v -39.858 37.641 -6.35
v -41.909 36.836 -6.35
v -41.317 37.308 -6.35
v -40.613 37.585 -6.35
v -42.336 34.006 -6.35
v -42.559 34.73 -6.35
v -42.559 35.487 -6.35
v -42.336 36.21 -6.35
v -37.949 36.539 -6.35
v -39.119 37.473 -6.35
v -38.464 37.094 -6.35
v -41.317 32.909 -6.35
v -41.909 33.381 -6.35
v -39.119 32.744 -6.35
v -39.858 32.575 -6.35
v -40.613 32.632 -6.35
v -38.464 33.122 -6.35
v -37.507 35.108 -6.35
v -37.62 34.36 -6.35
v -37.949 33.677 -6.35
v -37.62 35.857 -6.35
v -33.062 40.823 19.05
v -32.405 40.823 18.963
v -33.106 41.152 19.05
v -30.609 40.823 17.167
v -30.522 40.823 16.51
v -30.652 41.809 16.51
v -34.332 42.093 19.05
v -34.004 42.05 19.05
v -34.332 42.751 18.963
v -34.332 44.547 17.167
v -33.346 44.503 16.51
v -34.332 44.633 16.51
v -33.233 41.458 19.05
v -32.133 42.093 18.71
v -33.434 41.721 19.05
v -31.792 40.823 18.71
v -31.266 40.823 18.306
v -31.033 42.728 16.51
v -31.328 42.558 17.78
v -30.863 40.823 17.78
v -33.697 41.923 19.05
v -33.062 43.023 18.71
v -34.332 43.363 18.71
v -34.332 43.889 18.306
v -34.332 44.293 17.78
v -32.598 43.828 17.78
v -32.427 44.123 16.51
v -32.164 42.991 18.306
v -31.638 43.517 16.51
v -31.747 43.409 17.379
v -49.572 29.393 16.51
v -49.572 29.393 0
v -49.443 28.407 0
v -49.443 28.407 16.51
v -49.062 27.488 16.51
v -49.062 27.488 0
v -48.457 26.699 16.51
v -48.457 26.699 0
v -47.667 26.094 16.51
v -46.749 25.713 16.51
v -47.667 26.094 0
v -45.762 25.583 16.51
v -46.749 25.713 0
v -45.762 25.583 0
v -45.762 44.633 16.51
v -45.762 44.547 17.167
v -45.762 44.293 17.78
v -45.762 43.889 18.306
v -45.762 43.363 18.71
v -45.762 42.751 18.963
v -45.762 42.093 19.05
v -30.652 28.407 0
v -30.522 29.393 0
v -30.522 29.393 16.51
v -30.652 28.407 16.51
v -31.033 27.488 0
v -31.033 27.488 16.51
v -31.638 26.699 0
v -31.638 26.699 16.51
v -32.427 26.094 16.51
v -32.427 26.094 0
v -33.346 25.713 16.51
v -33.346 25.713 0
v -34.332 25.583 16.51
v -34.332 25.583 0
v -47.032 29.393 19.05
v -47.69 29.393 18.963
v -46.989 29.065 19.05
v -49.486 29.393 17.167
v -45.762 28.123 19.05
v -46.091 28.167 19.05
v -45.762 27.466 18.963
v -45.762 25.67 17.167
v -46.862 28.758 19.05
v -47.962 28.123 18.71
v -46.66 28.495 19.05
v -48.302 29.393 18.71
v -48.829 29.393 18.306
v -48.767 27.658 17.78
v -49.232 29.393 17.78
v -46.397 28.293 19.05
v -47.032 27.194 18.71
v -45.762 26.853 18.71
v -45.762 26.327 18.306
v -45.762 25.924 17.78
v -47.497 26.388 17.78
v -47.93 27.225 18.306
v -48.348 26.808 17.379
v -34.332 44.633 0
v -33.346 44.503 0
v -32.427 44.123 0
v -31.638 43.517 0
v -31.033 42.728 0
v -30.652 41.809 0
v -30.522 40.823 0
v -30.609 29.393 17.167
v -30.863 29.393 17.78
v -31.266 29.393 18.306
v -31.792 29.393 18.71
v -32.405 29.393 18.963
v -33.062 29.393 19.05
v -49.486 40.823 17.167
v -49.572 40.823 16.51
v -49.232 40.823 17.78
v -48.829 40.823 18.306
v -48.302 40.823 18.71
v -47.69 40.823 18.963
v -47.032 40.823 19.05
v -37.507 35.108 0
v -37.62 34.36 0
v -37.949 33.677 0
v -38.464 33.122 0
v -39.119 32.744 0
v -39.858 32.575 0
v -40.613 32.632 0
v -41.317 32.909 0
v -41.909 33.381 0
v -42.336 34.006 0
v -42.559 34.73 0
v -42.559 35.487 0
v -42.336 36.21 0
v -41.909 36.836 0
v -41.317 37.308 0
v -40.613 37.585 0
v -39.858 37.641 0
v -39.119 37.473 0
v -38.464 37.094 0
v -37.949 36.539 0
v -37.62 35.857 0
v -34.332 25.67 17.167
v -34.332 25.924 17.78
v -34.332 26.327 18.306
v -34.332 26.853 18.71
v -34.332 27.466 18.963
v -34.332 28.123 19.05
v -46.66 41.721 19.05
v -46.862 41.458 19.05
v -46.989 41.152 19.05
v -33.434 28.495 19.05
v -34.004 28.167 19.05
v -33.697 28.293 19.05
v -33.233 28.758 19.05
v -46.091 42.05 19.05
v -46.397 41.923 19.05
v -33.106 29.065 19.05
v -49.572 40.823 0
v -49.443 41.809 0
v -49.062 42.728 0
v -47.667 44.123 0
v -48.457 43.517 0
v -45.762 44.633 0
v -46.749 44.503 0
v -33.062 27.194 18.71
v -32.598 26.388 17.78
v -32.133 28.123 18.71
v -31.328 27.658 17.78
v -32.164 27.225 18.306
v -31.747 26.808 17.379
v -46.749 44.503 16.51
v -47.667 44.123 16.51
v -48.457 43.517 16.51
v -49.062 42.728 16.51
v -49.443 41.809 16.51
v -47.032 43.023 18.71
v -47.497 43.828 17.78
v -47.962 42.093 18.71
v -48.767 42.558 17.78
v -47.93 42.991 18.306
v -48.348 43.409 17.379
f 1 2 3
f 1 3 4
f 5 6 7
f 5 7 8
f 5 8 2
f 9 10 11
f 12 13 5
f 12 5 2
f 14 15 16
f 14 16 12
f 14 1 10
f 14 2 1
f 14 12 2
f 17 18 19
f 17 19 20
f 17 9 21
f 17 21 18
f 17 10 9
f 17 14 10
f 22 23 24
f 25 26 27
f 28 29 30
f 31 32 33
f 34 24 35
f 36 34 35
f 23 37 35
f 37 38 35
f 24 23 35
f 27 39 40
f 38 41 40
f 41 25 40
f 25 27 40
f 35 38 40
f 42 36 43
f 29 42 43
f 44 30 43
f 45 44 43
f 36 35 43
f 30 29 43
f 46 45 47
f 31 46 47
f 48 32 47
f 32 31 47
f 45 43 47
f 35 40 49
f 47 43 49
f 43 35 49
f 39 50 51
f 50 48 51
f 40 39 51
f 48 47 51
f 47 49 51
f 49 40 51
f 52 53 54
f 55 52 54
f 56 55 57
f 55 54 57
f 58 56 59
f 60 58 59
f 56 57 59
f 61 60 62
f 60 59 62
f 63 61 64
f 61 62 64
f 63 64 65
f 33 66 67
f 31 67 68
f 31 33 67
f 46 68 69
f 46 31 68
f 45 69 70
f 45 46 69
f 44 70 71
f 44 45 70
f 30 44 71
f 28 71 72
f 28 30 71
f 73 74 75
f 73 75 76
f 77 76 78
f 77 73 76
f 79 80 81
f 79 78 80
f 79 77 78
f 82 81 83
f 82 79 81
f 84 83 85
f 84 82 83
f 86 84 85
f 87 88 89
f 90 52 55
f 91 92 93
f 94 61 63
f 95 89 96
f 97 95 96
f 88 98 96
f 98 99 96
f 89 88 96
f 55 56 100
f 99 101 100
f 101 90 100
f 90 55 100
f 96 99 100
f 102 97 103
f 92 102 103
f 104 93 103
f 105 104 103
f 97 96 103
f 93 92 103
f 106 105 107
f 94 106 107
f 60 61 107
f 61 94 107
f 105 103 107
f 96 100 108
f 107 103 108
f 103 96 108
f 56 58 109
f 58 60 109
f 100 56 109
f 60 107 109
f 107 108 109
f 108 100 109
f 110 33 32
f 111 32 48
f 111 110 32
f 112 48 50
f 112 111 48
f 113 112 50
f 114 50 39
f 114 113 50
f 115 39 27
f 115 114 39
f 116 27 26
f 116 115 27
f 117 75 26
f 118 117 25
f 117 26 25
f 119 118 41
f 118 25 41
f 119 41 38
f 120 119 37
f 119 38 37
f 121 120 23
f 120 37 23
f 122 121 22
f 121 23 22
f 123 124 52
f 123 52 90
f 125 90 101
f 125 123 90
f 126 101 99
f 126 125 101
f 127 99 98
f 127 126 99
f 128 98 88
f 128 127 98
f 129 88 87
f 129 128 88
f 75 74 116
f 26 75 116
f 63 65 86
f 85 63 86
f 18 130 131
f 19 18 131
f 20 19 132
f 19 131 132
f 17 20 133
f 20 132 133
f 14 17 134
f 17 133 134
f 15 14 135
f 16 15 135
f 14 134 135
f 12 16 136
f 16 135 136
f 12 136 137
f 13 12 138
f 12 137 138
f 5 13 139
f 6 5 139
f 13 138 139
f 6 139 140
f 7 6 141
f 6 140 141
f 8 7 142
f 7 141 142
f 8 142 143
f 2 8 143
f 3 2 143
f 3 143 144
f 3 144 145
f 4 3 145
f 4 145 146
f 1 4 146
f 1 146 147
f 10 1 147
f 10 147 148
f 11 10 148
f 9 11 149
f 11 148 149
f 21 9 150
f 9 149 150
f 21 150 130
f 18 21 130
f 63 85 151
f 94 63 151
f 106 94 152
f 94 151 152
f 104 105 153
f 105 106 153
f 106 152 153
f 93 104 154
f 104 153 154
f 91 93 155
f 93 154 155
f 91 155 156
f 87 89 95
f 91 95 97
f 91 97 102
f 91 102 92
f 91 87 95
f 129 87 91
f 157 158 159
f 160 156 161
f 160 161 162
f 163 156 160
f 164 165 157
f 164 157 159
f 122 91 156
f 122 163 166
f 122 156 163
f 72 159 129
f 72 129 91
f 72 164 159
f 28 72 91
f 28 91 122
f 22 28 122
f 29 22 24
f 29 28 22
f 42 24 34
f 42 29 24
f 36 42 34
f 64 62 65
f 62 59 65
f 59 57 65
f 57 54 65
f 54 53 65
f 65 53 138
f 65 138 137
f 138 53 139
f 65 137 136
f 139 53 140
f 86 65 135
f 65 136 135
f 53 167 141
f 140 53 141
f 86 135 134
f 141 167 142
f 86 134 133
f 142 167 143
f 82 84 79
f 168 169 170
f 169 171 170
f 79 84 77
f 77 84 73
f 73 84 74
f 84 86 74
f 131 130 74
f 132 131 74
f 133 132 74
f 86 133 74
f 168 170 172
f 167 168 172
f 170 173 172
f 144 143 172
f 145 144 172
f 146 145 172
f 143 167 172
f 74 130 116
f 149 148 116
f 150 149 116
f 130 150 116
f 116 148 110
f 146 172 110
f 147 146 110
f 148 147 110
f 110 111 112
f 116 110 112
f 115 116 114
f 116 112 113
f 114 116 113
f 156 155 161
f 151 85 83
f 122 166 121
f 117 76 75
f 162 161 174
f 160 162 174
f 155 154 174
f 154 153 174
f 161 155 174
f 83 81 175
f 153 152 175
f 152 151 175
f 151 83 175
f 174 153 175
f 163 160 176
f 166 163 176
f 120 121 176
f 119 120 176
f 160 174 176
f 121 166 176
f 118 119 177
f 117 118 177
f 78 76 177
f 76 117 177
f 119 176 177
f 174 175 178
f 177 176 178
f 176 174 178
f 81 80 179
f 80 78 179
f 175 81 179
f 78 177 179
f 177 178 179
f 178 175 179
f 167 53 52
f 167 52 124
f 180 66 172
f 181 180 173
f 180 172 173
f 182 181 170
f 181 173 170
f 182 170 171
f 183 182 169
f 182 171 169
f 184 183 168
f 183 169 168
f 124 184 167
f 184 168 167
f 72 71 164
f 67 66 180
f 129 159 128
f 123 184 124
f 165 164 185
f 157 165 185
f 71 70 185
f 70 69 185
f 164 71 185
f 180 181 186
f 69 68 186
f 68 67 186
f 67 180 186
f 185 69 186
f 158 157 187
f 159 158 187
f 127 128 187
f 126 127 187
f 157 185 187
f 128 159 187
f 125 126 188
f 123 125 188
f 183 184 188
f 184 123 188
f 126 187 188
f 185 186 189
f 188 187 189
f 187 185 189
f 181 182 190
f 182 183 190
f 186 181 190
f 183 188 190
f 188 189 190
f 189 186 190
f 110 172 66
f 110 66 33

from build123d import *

# Parameters (mm, degrees)
F0_W         = 19.05
F0_H         = 19.05
F1_DEPTH     = 19.05
F2_R         = 2.54
F3_T1_DEPTH  = 28.575
F3_T4_ANGLE  = 90
F3_T6_ANGLE  = 90
F3_T8_ANGLE  = 90
F3_T10_ANGLE = 90
F4_R         = 2.54
F5_DEPTH     = 6.35


# Not quite as in the source:
# - a fillet or chamfer that OpenCascade refuses, or shapes differently, is made with other operations: its cross-section is extruded or revolved along the edge and cut away or added


with BuildPart() as f1:
    # F0 (on Top) → F1 (new body)
    with BuildSketch(Plane.XY):
        with Locations((-40.0474531332, 35.1082887501)):
            Rectangle(F0_W, F0_H)
    extrude(amount=F1_DEPTH)

    # F2
    f2_edges = [f1.edges().sort_by_distance(p)[0] for p in [
        (-40.047453, 44.633289, 19.05),
        (-49.572453, 35.108289, 19.05),
        (-40.047453, 25.583289, 19.05),
        (-30.522453, 35.108289, 19.05),
    ]]
    fillet(f2_edges, radius=F2_R)

    # F3: fillet of radius 3.81 on 4 edges, made by hand

    # F3_s2 → F3_t1 (cut)
    with BuildSketch(Plane.XY.offset(-9.525)):
        with BuildLine():
            ThreePointArc((-49.5724531332, 29.3932887501), (-48.4565299695, 26.6992119137), (-45.7624531332, 25.5832887501))
            Line((-45.7624531332, 25.5832887501), (-49.5724531332, 25.5832887501))
            Line((-49.5724531332, 25.5832887501), (-49.5724531332, 29.3932887501))
        make_face()
        with BuildLine():
            ThreePointArc((-45.7624531332, 44.6332887501), (-48.4565299695, 43.5173655864), (-49.5724531332, 40.8232887501))
            Line((-49.5724531332, 40.8232887501), (-49.5724531332, 44.6332887501))
            Line((-49.5724531332, 44.6332887501), (-45.7624531332, 44.6332887501))
        make_face()
        with BuildLine():
            ThreePointArc((-30.5224531332, 29.3932887501), (-31.6383762969, 26.6992119137), (-34.3324531332, 25.5832887501))
            Line((-34.3324531332, 25.5832887501), (-30.5224531332, 25.5832887501))
            Line((-30.5224531332, 25.5832887501), (-30.5224531332, 29.3932887501))
        make_face()
        with BuildLine():
            ThreePointArc((-34.3324531332, 44.6332887501), (-31.6383762969, 43.5173655864), (-30.5224531332, 40.8232887501))
            Line((-30.5224531332, 40.8232887501), (-30.5224531332, 44.6332887501))
            Line((-30.5224531332, 44.6332887501), (-34.3324531332, 44.6332887501))
        make_face()
    extrude(amount=F3_T1_DEPTH, mode=Mode.SUBTRACT)

    # F3_s3 → F3_t4 (revolve, cut)
    with BuildSketch(Plane.XZ.offset(-40.8232887501)):
        with BuildLine():
            ThreePointArc((-33.0624531332, 19.05), (-31.266401909, 18.3060512242), (-30.5224531332, 16.51))
            Line((-30.5224531332, 16.51), (-30.5224531332, 19.05))
            Line((-30.5224531332, 19.05), (-33.0624531332, 19.05))
        make_face()
    revolve(axis=Axis((-34.3324531332, 40.8232887501, 19.05), (0, 0, 1)), revolution_arc=F3_T4_ANGLE, mode=Mode.SUBTRACT)

    # F3_s5 → F3_t6 (revolve, cut)
    with BuildSketch(Plane.YZ.offset(-34.3324531332)):
        with BuildLine():
            ThreePointArc((28.1232887501, 19.05), (26.3272375258, 18.3060512242), (25.5832887501, 16.51))
            Line((25.5832887501, 16.51), (25.5832887501, 19.05))
            Line((25.5832887501, 19.05), (28.1232887501, 19.05))
        make_face()
    revolve(axis=Axis((-34.3324531332, 29.3932887501, 19.05), (0, 0, 1)), revolution_arc=F3_T6_ANGLE, mode=Mode.SUBTRACT)

    # F3_s7 → F3_t8 (revolve, cut)
    with BuildSketch(Plane.YZ.offset(-45.7624531332)):
        with BuildLine():
            ThreePointArc((42.0932887501, 19.05), (43.8893399743, 18.3060512242), (44.6332887501, 16.51))
            Line((44.6332887501, 16.51), (44.6332887501, 19.05))
            Line((44.6332887501, 19.05), (42.0932887501, 19.05))
        make_face()
    revolve(axis=Axis((-45.7624531332, 40.8232887501, 19.05), (0, 0, 1)), revolution_arc=F3_T8_ANGLE, mode=Mode.SUBTRACT)

    # F3_s9 → F3_t10 (revolve, cut)
    with BuildSketch(Plane.XZ.offset(-29.3932887501)):
        with BuildLine():
            ThreePointArc((-47.0324531332, 19.05), (-48.8285043574, 18.3060512242), (-49.5724531332, 16.51))
            Line((-49.5724531332, 16.51), (-49.5724531332, 19.05))
            Line((-49.5724531332, 19.05), (-47.0324531332, 19.05))
        make_face()
    revolve(axis=Axis((-45.7624531332, 29.3932887501, 19.05), (0, 0, 1)), revolution_arc=F3_T10_ANGLE, mode=Mode.SUBTRACT)

    # F4 (on face) → F5 (join)
    with BuildSketch(Plane(origin=(0, 0, 0), x_dir=(1, 0, 0), z_dir=(0, 0, -1))):
        with Locations((-40.0474531332, -35.1082887501)):
            Circle(F4_R)
    extrude(amount=F5_DEPTH)


solid = f1.part
